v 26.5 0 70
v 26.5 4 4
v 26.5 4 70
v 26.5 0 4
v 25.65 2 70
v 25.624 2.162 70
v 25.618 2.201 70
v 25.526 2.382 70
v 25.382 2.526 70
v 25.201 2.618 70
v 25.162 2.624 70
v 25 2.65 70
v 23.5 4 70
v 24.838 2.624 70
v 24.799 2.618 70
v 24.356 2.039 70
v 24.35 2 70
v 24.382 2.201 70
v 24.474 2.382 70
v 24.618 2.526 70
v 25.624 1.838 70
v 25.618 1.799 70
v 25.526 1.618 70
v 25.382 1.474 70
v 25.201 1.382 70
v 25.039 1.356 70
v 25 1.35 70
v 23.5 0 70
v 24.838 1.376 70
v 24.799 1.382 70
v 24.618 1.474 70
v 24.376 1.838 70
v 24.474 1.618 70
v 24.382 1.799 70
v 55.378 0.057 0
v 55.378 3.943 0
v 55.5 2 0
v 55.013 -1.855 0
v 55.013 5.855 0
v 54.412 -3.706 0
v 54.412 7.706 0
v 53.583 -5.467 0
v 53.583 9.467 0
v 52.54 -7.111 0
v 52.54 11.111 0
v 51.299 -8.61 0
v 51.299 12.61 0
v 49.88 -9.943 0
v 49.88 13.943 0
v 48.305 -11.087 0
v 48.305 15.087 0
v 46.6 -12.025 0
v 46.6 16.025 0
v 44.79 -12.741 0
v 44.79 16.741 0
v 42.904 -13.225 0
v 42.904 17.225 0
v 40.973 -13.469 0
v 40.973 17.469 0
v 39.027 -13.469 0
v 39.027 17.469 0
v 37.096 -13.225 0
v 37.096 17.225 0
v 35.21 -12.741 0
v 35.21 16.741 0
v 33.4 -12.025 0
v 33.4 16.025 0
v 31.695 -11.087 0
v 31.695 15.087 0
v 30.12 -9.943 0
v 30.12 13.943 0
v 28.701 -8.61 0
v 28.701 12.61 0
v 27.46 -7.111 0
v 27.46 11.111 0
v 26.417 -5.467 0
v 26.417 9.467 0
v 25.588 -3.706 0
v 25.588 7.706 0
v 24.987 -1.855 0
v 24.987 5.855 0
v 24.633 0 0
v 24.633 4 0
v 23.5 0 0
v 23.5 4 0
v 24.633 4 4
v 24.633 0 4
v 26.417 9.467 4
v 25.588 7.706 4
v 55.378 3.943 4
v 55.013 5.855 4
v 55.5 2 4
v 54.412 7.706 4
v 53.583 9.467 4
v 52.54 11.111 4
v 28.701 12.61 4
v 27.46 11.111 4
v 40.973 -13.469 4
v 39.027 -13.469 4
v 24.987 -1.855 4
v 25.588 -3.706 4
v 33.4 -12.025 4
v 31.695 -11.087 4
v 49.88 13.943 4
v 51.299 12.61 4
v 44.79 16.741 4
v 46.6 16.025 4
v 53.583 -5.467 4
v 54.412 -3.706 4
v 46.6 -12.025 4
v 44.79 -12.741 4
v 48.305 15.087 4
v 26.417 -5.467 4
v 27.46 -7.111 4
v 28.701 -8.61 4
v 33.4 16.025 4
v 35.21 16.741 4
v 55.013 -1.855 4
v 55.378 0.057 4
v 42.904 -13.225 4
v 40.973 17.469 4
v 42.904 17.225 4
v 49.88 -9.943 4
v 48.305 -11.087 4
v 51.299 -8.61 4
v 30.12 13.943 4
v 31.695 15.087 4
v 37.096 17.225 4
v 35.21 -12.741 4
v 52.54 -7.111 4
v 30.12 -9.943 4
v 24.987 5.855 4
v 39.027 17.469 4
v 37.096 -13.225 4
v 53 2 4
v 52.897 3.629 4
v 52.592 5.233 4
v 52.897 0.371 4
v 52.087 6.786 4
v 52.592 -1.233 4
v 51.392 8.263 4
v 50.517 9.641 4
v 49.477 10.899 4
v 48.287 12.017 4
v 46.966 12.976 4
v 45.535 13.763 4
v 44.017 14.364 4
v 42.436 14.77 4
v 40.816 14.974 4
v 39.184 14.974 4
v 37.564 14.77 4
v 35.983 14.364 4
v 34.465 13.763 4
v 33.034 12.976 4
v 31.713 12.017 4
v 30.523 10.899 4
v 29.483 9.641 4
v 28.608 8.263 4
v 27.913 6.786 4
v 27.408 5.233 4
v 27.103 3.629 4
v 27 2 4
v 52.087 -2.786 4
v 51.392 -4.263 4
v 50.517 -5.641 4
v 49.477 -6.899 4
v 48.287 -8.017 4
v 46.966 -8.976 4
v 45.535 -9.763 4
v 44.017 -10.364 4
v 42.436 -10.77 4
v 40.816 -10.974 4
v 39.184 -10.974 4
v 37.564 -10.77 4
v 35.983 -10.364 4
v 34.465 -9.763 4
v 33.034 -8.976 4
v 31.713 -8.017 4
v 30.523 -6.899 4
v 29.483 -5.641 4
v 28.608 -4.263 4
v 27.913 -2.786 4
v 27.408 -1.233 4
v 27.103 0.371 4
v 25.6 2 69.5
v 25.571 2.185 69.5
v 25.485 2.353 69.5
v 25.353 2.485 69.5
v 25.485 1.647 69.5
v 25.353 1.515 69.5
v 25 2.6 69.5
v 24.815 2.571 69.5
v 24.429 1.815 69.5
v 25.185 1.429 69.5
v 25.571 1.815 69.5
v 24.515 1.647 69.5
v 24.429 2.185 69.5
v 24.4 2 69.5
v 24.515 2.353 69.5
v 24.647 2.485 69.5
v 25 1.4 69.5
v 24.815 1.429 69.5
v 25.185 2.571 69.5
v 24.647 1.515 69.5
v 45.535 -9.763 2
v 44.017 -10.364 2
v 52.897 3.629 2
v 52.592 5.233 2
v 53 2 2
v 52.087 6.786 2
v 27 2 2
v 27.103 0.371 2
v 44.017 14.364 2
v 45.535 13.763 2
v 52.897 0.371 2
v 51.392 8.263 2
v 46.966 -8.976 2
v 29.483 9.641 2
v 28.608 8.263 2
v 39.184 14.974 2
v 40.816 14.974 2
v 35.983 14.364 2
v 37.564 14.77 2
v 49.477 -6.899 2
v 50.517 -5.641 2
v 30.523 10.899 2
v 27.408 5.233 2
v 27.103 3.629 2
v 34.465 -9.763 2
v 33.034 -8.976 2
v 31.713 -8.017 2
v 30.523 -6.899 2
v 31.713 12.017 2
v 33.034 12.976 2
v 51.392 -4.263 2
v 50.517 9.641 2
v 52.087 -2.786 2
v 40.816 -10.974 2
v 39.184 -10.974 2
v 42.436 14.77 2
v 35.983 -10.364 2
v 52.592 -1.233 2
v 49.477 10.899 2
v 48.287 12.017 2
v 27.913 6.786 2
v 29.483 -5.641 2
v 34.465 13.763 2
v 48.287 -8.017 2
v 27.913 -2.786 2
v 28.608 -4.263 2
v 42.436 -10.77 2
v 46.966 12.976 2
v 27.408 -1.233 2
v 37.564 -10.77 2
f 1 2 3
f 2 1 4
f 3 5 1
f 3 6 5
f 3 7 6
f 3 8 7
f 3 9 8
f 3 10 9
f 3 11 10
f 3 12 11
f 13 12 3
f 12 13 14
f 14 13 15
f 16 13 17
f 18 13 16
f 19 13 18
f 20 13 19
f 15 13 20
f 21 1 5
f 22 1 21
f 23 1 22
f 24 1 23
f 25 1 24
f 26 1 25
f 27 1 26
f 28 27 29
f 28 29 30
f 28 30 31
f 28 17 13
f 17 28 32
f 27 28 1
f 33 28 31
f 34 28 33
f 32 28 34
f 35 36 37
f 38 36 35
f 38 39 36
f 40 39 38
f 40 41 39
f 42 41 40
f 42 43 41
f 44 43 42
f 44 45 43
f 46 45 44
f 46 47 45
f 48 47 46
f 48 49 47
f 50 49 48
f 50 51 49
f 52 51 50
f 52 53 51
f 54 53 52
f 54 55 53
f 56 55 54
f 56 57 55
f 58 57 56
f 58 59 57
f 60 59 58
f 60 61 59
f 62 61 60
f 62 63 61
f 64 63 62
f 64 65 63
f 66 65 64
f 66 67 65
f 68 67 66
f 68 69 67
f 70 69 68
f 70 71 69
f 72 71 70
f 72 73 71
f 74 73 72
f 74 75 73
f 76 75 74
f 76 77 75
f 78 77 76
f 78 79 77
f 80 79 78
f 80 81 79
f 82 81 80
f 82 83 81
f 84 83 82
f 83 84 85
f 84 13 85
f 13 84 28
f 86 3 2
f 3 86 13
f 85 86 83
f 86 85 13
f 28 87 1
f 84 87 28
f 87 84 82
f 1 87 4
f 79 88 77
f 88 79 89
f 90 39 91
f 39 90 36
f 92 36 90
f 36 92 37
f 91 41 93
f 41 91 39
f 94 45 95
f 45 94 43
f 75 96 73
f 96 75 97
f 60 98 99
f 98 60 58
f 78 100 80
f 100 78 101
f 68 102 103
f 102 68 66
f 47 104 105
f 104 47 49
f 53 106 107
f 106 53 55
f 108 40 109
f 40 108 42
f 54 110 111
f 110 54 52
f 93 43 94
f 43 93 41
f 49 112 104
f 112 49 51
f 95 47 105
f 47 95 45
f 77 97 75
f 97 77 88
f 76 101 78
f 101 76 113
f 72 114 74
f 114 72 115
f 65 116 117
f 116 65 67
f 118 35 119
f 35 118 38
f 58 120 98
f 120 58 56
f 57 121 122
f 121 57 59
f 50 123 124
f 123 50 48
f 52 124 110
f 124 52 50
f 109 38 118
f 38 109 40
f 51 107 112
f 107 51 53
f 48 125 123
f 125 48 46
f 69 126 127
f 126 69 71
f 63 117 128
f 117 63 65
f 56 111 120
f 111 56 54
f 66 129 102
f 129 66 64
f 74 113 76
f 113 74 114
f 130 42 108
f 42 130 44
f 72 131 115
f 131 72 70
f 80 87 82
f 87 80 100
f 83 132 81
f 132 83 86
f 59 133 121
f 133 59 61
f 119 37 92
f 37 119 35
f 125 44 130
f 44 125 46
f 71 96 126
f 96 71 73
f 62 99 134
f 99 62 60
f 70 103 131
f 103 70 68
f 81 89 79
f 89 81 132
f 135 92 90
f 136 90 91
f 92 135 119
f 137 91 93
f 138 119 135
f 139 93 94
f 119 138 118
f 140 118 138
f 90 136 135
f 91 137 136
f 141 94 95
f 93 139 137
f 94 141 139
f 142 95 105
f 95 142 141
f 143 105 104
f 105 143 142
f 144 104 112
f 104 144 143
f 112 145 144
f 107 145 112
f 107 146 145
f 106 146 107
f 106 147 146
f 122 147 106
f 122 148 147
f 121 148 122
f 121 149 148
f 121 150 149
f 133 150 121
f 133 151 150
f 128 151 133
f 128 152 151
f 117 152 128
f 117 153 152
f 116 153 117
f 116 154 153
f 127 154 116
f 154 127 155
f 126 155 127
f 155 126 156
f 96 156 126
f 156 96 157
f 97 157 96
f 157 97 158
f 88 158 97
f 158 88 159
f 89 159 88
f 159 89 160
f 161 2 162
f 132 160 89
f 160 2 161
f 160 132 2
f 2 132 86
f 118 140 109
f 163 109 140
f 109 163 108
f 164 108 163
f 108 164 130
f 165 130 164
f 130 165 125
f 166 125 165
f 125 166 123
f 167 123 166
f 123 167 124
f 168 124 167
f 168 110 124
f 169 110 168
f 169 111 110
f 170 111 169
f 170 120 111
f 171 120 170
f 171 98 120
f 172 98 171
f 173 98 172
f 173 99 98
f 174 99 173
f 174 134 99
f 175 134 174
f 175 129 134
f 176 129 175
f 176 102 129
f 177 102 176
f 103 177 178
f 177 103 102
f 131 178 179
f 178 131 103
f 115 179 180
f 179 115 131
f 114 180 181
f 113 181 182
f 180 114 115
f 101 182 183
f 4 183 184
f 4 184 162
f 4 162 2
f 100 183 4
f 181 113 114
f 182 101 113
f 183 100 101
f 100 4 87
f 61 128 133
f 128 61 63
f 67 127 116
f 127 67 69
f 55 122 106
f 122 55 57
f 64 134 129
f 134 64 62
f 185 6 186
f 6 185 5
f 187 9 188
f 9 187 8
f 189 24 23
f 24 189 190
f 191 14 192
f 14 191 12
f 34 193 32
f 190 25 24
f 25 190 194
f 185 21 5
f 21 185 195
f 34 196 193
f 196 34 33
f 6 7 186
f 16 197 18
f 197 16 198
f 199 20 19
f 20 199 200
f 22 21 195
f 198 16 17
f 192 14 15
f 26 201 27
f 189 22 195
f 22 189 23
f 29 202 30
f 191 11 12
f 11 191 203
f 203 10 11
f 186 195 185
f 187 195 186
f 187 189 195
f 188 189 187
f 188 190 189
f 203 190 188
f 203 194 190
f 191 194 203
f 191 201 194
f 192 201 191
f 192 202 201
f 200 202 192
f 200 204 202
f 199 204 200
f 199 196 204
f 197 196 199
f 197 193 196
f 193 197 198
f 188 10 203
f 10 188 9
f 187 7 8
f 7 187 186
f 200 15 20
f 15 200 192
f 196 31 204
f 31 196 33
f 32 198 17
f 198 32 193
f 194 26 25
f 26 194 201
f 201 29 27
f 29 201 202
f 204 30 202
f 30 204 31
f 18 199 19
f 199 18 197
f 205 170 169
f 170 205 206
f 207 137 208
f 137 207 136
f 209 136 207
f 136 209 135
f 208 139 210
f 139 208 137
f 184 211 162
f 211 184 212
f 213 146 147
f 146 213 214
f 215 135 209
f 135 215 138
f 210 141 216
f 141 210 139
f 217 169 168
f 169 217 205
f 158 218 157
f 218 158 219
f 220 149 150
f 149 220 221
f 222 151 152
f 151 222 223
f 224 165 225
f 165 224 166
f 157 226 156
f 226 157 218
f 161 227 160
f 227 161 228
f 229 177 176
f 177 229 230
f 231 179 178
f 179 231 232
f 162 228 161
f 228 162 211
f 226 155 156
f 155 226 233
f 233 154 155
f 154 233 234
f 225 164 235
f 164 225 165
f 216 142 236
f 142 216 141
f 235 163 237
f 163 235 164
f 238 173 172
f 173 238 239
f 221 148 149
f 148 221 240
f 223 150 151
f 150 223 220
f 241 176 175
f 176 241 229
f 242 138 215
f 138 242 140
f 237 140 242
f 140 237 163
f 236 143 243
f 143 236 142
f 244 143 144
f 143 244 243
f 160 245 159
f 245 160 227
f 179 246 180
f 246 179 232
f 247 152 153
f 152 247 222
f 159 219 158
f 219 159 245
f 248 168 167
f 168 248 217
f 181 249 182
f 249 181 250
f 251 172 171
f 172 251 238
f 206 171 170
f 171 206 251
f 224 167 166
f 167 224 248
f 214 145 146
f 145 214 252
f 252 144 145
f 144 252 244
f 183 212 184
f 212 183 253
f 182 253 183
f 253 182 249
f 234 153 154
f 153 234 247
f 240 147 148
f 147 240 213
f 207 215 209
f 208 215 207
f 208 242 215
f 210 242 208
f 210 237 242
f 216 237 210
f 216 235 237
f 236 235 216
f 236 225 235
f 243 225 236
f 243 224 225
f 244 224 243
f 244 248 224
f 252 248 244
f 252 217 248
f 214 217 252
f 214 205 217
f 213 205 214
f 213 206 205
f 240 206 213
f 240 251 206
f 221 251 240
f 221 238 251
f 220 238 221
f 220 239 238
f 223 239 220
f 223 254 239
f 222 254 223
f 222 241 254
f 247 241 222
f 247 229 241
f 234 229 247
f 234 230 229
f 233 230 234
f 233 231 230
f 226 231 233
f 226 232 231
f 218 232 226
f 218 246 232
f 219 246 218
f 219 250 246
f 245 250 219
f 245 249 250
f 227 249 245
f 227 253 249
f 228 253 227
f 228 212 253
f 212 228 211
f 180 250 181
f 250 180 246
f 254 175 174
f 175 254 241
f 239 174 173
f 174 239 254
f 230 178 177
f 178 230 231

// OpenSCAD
difference(){
    union(){
        
        translate([25-1.5,0,0]) cube([3,4,70]);
        translate([40,2,0]) cylinder(4,d=31,$fn=50);
        
    };
    union(){
        translate([25,2,70-0.5]) cylinder(4,0.6,$fn=20);
        translate([40,2,2]) cylinder(2,d=26,$fn=50);
    };
 };
